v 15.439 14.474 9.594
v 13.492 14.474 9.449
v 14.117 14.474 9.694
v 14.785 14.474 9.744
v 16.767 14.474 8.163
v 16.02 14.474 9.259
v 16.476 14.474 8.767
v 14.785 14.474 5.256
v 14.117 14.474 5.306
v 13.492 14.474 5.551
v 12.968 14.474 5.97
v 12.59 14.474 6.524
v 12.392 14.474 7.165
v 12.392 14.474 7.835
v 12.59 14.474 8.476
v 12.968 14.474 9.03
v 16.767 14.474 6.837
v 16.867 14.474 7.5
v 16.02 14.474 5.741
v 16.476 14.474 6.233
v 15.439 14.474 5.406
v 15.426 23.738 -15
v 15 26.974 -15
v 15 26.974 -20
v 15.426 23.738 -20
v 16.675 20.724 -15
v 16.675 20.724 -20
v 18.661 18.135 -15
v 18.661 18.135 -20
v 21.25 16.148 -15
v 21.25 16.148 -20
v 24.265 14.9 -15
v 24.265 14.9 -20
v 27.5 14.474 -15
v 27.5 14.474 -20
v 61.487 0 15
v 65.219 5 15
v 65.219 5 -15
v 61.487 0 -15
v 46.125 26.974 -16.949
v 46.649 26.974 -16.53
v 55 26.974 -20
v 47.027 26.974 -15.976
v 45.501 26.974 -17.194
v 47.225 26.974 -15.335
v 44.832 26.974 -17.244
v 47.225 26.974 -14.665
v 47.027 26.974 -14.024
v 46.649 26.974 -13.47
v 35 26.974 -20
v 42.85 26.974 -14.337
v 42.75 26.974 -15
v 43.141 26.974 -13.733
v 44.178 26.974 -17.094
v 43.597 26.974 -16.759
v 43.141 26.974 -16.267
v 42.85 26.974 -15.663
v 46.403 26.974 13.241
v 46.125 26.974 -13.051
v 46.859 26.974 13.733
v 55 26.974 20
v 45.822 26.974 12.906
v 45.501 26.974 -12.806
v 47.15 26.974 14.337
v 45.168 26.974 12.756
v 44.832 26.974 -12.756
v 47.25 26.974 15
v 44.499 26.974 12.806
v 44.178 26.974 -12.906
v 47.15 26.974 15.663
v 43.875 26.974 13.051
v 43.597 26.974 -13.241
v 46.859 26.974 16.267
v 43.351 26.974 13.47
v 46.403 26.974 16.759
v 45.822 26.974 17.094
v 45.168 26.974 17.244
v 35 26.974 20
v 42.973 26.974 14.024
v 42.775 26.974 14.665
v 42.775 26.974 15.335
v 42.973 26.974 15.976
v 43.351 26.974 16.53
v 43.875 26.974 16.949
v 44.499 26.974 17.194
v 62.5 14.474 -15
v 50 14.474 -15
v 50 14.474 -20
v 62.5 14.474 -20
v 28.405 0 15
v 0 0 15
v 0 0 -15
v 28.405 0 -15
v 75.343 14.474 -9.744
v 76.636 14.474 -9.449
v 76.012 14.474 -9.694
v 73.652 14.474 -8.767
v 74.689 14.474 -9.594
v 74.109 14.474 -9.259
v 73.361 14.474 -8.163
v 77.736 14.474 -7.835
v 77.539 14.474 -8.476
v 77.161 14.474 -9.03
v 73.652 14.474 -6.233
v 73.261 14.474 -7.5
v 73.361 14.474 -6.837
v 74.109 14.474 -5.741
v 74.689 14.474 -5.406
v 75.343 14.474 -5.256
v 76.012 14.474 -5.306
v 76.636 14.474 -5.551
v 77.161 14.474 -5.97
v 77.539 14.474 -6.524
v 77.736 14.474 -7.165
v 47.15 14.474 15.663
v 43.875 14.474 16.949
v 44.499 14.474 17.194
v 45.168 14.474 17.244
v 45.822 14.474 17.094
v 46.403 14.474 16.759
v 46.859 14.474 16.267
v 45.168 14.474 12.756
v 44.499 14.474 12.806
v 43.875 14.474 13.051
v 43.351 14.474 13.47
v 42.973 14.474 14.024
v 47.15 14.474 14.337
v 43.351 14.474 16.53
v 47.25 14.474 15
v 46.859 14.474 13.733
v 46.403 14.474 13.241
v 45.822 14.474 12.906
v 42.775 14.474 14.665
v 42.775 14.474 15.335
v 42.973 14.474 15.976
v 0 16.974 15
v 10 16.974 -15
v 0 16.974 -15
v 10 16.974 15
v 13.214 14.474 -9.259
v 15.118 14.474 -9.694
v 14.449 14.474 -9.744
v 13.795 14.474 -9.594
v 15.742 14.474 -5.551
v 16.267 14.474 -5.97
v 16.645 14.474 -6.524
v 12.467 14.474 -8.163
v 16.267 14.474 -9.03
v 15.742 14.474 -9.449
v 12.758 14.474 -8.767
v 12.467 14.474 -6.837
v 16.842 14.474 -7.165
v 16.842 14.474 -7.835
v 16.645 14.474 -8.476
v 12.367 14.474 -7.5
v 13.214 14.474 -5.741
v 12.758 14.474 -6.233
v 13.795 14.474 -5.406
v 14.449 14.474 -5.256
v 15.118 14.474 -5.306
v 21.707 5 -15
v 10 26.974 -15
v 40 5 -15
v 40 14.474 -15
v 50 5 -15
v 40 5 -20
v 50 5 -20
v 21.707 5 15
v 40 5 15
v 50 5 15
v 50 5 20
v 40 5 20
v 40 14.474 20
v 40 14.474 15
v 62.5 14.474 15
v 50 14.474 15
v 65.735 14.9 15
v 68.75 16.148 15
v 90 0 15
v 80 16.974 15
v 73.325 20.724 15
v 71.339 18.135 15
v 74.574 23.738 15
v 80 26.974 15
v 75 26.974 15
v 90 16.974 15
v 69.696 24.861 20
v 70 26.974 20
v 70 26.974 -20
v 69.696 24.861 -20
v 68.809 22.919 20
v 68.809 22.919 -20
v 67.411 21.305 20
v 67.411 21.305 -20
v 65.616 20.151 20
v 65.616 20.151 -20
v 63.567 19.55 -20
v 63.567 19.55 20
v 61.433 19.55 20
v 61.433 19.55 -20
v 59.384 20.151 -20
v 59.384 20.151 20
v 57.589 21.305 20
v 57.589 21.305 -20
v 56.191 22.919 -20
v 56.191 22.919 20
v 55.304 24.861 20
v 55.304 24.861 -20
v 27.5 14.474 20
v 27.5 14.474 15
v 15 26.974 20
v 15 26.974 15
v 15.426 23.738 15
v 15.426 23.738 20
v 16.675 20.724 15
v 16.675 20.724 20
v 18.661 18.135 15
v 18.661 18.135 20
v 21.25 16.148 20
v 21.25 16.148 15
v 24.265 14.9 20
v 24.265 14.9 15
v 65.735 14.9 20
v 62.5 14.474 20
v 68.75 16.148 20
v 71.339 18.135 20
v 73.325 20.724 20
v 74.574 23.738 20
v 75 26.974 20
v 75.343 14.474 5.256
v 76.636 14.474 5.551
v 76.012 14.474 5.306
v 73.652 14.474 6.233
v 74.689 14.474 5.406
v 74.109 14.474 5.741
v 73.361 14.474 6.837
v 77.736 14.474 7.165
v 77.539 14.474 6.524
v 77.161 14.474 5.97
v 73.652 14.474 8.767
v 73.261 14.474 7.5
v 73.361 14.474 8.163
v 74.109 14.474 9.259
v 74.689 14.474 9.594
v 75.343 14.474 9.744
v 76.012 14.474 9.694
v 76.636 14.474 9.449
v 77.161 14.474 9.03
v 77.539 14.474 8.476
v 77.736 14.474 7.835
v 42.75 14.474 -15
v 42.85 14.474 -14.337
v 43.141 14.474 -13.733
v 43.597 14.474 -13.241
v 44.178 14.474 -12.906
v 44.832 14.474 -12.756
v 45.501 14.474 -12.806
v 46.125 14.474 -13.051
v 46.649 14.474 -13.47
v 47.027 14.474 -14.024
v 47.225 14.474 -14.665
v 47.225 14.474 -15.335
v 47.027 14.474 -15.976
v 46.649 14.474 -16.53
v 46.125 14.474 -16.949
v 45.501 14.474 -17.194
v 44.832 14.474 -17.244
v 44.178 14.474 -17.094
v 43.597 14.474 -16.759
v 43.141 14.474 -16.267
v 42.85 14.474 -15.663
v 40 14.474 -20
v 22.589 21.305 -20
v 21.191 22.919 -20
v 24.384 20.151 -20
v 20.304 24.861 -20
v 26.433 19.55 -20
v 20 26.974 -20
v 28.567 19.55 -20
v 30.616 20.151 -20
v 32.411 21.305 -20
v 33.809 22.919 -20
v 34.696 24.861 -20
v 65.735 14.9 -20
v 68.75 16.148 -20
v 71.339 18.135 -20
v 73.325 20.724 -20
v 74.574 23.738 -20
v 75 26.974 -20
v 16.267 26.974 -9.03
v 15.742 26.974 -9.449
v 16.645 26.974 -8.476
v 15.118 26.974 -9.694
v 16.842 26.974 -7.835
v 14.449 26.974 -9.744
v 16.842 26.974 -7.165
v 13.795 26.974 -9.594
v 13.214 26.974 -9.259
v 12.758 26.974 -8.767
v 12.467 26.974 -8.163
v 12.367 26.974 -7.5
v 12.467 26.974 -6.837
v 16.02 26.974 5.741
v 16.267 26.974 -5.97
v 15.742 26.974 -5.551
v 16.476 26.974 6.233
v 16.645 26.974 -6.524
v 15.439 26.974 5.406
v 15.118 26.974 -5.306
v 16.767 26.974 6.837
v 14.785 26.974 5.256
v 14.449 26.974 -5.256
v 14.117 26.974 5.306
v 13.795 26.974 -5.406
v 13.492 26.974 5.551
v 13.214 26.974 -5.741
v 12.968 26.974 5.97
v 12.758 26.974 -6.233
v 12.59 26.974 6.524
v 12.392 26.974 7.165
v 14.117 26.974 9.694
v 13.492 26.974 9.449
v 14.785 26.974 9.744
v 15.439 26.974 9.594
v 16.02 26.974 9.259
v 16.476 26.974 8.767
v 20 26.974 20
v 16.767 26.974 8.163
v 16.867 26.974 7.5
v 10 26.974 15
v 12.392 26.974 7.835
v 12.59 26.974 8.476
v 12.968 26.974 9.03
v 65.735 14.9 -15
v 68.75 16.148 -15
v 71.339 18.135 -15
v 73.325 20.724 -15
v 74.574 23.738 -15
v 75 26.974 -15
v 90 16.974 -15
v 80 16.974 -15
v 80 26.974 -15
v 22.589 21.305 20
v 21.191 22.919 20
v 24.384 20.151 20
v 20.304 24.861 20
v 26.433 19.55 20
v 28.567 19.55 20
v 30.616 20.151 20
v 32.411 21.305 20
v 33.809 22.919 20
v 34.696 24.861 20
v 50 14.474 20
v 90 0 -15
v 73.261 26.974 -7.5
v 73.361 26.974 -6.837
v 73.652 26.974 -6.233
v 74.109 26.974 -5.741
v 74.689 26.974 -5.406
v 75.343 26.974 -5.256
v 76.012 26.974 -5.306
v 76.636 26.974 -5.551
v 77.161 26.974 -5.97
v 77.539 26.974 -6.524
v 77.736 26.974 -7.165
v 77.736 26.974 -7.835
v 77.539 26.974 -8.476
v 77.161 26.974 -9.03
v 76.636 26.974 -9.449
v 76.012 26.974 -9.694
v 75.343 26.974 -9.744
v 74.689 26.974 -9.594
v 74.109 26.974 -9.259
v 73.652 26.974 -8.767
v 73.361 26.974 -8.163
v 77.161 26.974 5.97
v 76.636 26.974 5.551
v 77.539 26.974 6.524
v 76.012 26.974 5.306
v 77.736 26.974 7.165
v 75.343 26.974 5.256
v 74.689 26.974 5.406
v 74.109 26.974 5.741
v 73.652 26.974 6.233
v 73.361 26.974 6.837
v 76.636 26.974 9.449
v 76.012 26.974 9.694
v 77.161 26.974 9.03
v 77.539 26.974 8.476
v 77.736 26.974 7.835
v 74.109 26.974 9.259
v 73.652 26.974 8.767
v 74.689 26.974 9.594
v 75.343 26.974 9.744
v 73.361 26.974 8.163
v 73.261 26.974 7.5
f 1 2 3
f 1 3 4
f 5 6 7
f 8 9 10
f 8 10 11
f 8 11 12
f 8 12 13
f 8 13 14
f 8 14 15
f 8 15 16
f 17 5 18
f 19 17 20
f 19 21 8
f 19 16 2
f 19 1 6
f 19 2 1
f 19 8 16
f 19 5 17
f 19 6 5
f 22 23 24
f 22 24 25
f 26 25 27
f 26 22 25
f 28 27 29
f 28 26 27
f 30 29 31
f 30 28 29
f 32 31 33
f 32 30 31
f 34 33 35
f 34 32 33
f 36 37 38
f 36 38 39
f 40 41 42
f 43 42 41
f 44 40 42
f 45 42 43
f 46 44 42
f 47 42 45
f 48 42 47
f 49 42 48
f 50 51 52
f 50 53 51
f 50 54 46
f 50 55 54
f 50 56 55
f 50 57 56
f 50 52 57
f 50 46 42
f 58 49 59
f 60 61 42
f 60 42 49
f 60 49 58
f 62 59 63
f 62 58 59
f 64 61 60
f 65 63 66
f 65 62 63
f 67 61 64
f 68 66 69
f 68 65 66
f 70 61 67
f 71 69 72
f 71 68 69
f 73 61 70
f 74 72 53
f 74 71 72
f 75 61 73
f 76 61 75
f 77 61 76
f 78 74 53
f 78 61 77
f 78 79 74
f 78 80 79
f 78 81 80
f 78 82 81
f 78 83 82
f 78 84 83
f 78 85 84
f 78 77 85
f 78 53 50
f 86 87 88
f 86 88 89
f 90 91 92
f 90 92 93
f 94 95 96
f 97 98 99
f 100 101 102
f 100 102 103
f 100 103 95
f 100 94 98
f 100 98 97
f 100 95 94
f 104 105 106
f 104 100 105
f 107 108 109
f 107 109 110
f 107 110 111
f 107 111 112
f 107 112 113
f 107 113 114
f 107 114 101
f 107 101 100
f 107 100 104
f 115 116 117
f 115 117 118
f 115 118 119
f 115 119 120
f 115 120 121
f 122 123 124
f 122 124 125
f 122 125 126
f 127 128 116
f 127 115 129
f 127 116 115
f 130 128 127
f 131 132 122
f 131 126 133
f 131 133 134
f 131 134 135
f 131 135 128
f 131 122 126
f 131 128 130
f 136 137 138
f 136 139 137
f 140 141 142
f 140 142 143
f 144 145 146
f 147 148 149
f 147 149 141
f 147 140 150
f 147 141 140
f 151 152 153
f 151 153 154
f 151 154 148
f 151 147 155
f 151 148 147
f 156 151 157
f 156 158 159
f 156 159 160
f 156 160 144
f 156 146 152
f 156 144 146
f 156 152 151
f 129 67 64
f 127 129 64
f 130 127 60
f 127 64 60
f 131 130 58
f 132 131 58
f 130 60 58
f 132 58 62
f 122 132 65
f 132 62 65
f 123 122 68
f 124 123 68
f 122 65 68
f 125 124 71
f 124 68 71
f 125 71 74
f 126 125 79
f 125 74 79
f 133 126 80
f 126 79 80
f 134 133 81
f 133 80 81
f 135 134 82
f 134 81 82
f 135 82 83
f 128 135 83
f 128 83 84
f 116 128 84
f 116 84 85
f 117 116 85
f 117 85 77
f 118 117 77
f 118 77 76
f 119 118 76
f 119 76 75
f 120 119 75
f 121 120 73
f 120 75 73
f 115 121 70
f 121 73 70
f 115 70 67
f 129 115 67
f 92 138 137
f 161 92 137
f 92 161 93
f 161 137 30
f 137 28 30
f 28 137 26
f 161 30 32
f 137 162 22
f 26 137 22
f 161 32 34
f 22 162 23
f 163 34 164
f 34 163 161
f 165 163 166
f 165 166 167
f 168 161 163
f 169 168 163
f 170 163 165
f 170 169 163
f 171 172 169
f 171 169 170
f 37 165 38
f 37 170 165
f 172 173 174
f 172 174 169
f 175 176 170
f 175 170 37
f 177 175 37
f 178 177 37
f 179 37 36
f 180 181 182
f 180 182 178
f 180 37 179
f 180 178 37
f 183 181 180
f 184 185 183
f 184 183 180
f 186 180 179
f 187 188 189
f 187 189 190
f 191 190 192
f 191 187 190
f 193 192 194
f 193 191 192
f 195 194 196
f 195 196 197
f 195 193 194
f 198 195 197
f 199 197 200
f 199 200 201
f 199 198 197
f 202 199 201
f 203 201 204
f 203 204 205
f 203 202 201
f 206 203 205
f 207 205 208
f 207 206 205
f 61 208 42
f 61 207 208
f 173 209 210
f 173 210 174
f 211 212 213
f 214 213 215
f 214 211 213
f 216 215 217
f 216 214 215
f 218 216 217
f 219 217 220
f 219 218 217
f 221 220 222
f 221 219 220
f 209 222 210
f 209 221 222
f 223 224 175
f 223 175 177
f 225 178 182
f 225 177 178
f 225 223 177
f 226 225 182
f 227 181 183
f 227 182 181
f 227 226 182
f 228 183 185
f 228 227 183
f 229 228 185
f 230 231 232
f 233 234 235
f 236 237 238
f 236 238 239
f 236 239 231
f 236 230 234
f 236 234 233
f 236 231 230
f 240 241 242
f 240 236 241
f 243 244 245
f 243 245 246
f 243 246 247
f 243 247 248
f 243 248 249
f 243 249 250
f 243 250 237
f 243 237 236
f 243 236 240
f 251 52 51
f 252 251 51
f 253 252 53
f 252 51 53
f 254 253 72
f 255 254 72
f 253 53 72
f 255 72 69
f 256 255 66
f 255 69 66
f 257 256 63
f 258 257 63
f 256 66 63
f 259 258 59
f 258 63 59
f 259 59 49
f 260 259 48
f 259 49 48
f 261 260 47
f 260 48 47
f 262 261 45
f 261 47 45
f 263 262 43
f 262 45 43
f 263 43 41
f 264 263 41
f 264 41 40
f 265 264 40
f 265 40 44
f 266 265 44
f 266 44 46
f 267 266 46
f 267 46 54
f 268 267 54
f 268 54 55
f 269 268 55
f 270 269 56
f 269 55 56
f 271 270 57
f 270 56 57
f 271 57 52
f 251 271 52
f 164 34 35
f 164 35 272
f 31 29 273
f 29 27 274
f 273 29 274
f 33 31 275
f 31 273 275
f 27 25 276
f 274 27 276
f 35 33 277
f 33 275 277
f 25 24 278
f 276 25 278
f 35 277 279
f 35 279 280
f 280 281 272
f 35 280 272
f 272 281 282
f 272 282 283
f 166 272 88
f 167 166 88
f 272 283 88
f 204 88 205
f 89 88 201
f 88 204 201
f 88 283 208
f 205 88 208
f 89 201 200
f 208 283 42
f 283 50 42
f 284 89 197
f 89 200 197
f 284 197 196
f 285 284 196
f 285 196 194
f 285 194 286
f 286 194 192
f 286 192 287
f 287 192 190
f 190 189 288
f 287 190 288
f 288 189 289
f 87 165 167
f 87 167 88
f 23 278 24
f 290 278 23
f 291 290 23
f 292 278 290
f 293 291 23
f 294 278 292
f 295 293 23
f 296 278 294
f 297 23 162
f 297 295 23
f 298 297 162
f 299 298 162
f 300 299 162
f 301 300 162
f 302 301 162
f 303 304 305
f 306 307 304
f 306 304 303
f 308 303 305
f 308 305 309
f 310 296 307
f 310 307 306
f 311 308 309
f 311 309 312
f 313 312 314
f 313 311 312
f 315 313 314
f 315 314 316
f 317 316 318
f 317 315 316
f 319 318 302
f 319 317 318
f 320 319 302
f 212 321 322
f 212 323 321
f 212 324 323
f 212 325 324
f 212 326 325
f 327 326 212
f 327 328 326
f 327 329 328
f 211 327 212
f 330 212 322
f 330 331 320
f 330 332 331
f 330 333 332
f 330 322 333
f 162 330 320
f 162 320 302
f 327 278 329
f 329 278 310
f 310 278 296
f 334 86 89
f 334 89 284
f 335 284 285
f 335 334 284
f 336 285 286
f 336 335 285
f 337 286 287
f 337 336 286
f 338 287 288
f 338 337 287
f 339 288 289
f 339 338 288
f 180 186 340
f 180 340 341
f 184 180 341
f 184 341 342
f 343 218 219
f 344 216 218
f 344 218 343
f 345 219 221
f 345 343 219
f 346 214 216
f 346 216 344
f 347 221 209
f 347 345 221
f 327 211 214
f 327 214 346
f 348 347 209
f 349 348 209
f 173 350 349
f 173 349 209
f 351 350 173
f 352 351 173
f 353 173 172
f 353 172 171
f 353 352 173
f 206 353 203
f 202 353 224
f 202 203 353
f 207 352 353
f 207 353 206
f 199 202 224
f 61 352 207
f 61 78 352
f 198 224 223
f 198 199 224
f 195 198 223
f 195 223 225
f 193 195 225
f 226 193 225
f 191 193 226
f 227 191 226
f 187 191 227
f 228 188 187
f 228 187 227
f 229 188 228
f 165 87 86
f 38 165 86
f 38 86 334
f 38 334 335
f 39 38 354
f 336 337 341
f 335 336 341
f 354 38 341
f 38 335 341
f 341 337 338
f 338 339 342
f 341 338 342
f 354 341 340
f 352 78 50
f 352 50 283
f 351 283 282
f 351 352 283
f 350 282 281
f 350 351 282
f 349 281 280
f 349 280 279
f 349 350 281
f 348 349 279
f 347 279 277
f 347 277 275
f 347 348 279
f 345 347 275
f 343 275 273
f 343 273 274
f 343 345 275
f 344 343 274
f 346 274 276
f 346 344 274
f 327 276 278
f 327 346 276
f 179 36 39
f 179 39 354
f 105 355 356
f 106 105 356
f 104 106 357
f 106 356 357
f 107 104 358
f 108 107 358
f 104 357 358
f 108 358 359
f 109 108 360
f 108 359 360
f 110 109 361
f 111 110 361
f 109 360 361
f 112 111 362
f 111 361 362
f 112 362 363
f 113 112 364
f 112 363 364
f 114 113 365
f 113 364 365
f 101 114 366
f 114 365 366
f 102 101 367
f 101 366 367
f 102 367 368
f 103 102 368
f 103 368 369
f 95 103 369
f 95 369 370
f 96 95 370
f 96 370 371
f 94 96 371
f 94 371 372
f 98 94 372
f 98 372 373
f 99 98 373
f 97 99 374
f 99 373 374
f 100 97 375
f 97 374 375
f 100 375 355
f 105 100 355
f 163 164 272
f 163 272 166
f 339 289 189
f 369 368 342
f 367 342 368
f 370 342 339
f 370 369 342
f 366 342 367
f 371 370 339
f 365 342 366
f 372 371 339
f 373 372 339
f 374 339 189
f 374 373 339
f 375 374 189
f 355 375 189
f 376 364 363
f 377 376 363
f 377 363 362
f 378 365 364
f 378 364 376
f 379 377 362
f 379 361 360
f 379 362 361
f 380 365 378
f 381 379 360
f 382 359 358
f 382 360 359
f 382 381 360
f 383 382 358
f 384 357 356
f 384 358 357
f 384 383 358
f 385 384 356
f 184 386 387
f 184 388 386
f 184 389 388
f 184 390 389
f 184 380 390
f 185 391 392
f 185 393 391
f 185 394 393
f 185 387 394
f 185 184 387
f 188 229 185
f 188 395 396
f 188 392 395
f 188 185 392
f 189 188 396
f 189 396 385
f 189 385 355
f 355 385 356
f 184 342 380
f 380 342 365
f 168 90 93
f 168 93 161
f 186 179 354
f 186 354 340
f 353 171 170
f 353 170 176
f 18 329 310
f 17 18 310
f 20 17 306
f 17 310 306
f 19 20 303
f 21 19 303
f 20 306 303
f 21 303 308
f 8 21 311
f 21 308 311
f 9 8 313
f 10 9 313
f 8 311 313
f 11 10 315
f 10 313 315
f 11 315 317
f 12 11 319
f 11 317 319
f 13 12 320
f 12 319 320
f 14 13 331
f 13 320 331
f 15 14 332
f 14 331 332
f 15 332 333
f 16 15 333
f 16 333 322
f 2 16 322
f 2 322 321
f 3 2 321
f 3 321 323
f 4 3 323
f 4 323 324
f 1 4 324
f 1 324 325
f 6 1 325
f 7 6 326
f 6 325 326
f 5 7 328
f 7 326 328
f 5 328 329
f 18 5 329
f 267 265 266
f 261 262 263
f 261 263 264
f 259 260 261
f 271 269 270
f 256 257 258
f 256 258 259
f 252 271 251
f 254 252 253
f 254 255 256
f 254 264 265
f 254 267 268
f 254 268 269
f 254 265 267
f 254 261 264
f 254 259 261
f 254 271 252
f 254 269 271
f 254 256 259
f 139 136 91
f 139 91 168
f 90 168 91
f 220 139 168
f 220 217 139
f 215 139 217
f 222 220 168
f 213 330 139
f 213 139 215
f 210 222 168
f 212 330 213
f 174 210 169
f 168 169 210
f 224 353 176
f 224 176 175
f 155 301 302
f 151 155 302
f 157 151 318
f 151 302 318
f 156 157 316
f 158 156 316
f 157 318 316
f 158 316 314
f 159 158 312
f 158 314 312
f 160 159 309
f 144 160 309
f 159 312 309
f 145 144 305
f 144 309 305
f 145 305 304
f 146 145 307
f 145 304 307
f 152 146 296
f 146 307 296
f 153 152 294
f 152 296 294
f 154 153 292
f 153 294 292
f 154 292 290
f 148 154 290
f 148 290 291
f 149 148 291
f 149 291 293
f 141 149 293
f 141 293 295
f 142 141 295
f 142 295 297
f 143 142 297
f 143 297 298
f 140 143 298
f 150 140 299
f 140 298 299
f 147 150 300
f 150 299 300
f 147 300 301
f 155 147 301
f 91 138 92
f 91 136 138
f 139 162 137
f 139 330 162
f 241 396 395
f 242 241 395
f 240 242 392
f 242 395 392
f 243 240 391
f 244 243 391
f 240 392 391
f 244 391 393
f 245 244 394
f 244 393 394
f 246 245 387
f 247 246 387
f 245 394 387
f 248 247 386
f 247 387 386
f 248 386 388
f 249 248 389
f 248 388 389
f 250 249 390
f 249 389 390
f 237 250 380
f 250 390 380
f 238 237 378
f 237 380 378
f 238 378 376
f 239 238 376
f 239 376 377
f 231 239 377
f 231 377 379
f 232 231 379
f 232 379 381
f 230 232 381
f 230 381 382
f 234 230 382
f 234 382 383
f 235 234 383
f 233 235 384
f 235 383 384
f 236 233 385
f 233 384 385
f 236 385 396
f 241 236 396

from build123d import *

# Parameters (mm, degrees)
BOSS_EXTRUDE1_DEPTH   = 15
BOSS_EXTRUDE1_2_DEPTH = 15
BOSS_EXTRUDE2_DEPTH   = 20
SKETCH2_R             = 2.25
CUT_EXTRUDE2_DEPTH    = 12.5


with BuildPart() as part:
    # Sketch1 → Boss-Extrude1 (new, symmetric)
    with BuildSketch(Plane.XY):
        with BuildLine():
            Line((0, 16.97357793), (0, 0))
            Line((0, 0), (28.405213846, 0))
            Line((28.405213846, 0), (21.707328852, 5))
            Line((21.707328852, 5), (40, 5))
            Line((40, 5), (40, 14.47357793))
            Line((40, 14.47357793), (27.5, 14.47357793))
            ThreePointArc((27.5, 14.47357793), (18.661165235, 18.134743165), (15, 26.97357793))
            Line((15, 26.97357793), (10, 26.97357793))
            Line((10, 26.97357793), (10, 16.97357793))
            Line((10, 16.97357793), (0, 16.97357793))
        make_face()
    extrude(amount=BOSS_EXTRUDE1_DEPTH, both=True)



with BuildPart() as body_2:
    # Sketch1 → Boss-Extrude1 2 (new, symmetric)
    with BuildSketch(Plane.XY):
        with BuildLine():
            Line((50, 14.47357793), (50, 5))
            Line((50, 5), (65.219288167, 5))
            Line((65.219288167, 5), (61.486766629, 0))
            Line((61.486766629, 0), (90, 0))
            Line((90, 0), (90, 16.97357793))
            Line((90, 16.97357793), (80, 16.97357793))
            Line((80, 16.97357793), (80, 26.97357793))
            Line((80, 26.97357793), (75, 26.97357793))
            ThreePointArc((75, 26.97357793), (71.338834765, 18.134743165), (62.5, 14.47357793))
            Line((62.5, 14.47357793), (50, 14.47357793))
        make_face()
    extrude(amount=BOSS_EXTRUDE1_2_DEPTH, both=True)


with BuildPart() as part_1:
    add(part.part)

    add(body_2.part)  # Boss-Extrude2 merges body 2
    # Sketch1<3> → Boss-Extrude2 (add, symmetric)
    with BuildSketch(Plane.XY):
        with BuildLine():
            Line((40, 14.47357793), (40, 5))
            Line((40, 5), (50, 5))
            Line((50, 5), (50, 14.47357793))
            Line((50, 14.47357793), (62.5, 14.47357793))
            ThreePointArc((62.5, 14.47357793), (71.338834765, 18.134743165), (75, 26.97357793))
            Line((75, 26.97357793), (70, 26.97357793))
            ThreePointArc((70, 26.97357793), (62.5, 19.47357793), (55, 26.97357793))
            Line((55, 26.97357793), (35, 26.97357793))
            ThreePointArc((35, 26.97357793), (27.5, 19.47357793), (20, 26.97357793))
            Line((20, 26.97357793), (15, 26.97357793))
            ThreePointArc((15, 26.97357793), (18.661165235, 18.134743165), (27.5, 14.47357793))
            Line((27.5, 14.47357793), (40, 14.47357793))
        make_face()
    extrude(amount=BOSS_EXTRUDE2_DEPTH, both=True)

    # Sketch2 → Cut-Extrude2 (cut)
    with BuildSketch(Plane(origin=(0, 26.97357793, 0), x_dir=(1, 0, 0), z_dir=(0, 1, 0))):
        with Locations((14.617344239, 7.5)):
            Circle(SKETCH2_R)
        with Locations((45, 15)):
            Circle(SKETCH2_R)
        with Locations((45, -15)):
            Circle(SKETCH2_R)
        with Locations((14.617344239, -7.5)):
            Circle(SKETCH2_R)
        with Locations((75.511403754, 7.5)):
            Circle(SKETCH2_R)
        with Locations((75.511403754, -7.5)):
            Circle(SKETCH2_R)
    extrude(amount=-CUT_EXTRUDE2_DEPTH, mode=Mode.SUBTRACT)


solid = part_1.part
